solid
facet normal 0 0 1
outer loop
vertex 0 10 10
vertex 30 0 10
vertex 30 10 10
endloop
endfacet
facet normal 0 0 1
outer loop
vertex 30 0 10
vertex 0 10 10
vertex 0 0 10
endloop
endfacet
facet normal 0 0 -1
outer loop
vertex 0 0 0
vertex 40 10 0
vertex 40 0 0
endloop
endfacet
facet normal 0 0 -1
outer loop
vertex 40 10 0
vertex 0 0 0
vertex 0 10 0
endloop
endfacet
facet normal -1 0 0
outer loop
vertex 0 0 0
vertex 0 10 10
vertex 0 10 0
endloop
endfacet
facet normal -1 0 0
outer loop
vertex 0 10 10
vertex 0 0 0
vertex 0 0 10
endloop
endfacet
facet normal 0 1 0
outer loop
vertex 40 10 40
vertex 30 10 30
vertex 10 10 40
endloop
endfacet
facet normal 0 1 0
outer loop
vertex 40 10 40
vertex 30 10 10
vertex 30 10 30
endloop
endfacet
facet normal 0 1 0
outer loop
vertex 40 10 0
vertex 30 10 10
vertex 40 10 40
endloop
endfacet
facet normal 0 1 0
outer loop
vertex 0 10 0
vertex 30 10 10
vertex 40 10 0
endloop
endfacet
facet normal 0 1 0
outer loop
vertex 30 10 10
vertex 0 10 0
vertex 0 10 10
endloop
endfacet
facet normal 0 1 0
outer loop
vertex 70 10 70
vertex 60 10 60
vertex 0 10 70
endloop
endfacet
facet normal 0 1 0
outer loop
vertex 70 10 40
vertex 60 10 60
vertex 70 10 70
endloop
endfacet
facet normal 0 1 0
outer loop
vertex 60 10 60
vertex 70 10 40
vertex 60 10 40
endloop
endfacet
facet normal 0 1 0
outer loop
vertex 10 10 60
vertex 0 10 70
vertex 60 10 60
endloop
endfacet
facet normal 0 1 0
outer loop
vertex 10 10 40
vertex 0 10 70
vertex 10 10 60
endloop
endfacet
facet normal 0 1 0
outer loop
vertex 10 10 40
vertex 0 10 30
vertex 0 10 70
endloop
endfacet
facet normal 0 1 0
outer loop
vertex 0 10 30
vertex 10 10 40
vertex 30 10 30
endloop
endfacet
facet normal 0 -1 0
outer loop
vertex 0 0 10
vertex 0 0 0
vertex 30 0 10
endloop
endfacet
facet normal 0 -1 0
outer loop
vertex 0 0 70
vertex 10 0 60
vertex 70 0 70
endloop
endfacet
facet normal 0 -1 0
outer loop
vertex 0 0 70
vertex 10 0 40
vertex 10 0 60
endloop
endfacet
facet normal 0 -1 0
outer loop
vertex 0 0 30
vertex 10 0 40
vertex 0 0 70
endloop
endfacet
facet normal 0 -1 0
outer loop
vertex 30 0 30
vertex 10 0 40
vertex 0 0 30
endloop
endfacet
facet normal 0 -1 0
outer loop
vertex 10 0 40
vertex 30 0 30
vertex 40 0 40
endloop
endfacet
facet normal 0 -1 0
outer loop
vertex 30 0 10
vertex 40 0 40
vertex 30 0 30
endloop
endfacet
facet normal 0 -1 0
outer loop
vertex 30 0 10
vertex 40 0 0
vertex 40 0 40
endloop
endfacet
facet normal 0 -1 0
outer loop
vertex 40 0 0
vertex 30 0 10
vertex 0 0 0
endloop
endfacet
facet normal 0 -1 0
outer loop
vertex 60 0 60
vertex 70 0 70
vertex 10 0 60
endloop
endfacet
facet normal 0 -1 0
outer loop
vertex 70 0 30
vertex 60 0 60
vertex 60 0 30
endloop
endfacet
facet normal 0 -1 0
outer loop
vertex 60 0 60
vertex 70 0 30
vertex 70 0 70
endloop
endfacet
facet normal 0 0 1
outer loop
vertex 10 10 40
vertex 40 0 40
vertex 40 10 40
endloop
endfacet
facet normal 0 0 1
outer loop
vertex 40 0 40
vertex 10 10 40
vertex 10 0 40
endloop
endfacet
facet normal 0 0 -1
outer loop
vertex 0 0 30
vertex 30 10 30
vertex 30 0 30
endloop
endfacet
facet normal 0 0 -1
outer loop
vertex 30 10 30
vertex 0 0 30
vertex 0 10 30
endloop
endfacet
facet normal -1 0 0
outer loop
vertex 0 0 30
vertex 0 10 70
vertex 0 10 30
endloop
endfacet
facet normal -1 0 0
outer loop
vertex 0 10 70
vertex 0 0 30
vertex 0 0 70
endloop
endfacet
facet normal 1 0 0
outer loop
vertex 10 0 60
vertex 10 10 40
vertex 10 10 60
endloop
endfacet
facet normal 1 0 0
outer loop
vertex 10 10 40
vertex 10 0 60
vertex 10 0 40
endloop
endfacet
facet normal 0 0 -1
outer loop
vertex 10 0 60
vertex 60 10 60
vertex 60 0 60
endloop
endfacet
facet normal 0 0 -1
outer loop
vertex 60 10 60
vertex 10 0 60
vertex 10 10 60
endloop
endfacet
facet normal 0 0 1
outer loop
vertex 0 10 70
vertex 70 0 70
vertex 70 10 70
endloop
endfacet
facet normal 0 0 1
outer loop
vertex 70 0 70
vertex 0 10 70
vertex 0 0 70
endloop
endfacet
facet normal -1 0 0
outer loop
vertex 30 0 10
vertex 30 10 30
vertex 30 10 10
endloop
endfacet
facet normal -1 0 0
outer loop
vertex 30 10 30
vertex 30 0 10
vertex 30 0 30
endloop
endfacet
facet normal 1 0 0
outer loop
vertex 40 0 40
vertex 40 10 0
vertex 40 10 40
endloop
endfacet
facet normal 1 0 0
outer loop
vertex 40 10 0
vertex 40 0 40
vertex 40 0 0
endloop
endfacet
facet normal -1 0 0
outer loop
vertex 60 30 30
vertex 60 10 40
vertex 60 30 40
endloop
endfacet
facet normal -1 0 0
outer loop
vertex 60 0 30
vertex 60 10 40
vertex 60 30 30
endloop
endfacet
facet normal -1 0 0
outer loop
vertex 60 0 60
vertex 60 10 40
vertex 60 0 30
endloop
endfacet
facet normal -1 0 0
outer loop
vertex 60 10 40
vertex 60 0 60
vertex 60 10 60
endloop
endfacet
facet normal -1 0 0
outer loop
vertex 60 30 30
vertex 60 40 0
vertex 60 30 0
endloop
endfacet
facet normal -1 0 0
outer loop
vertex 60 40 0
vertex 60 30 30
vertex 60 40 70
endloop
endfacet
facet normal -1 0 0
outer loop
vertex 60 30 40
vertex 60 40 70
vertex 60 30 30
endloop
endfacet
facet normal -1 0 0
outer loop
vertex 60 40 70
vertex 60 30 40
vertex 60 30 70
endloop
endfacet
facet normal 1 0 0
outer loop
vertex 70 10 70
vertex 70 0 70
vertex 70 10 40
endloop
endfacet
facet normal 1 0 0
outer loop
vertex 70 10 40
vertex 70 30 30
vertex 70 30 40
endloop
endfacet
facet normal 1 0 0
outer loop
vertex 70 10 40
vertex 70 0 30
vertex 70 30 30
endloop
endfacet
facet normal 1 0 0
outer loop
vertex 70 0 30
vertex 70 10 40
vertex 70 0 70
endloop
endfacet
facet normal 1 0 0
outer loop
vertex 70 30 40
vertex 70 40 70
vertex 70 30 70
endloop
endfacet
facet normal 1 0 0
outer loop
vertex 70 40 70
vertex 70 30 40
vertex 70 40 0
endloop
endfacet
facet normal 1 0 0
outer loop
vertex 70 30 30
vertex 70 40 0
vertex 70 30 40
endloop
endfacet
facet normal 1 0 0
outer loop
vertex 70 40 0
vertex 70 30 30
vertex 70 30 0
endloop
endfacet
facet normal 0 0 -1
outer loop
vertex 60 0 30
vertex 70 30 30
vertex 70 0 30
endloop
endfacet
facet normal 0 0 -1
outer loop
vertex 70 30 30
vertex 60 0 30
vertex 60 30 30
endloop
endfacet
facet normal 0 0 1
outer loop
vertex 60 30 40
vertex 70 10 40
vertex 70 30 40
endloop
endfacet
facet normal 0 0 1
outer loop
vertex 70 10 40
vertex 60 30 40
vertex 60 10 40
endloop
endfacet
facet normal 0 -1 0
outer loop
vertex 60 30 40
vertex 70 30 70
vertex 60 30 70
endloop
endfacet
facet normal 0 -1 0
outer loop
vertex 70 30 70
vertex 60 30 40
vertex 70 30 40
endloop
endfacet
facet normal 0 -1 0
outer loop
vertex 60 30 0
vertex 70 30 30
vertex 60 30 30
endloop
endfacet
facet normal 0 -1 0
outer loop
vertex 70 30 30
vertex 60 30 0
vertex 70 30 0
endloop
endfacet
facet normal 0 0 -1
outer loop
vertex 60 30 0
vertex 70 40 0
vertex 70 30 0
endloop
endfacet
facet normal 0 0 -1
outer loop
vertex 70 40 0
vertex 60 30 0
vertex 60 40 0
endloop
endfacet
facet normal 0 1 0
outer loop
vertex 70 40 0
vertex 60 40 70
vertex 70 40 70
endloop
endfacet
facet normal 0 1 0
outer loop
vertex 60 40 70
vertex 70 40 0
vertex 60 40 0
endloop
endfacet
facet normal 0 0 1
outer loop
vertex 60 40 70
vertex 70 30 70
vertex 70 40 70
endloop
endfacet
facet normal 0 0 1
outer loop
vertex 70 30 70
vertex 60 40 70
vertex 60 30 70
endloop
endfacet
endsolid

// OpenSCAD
//Creation of an association logo from a 3D table indicating the precense or not of a cuboid

/* [Global] */

// Size of a cuboid
size = 10;

array = 
[
 [
  [1,1,1,1,0,0,0],
  [0,0,0,1,0,0,0],
  [0,0,0,1,0,0,0],
  [1,1,1,1,0,0,1],
  [1,0,0,0,0,0,1],
  [1,0,0,0,0,0,1],
  [1,1,1,1,1,1,1]
 ],[
  [0,0,0,0,0,0,0],
  [0,0,0,0,0,0,0],
  [0,0,0,0,0,0,0],
  [0,0,0,0,0,0,1],
  [0,0,0,0,0,0,0],
  [0,0,0,0,0,0,0],
  [0,0,0,0,0,0,0]
 ],[
  [0,0,0,0,0,0,0],
  [0,0,0,0,0,0,0],
  [0,0,0,0,0,0,0],
  [0,0,0,0,0,0,1],
  [0,0,0,0,0,0,0],
  [0,0,0,0,0,0,0],
  [0,0,0,0,0,0,0]
 ],[
  [0,0,0,0,0,0,1],
  [0,0,0,0,0,0,1],
  [0,0,0,0,0,0,1],
  [0,0,0,0,0,0,1],
  [0,0,0,0,0,0,1],
  [0,0,0,0,0,0,1],
  [0,0,0,0,0,0,1]
 ]
];

union ()
{
    for (vX=[0:len(array[0][0])], vY=[0:len(array)], vZ=[0:len(array[0])])
    {
        if (array[vY][vZ][vX] == 1)
        {
            translate([vX*size, vY*size, vZ*size])
            cube(size);
        }
    }
}
